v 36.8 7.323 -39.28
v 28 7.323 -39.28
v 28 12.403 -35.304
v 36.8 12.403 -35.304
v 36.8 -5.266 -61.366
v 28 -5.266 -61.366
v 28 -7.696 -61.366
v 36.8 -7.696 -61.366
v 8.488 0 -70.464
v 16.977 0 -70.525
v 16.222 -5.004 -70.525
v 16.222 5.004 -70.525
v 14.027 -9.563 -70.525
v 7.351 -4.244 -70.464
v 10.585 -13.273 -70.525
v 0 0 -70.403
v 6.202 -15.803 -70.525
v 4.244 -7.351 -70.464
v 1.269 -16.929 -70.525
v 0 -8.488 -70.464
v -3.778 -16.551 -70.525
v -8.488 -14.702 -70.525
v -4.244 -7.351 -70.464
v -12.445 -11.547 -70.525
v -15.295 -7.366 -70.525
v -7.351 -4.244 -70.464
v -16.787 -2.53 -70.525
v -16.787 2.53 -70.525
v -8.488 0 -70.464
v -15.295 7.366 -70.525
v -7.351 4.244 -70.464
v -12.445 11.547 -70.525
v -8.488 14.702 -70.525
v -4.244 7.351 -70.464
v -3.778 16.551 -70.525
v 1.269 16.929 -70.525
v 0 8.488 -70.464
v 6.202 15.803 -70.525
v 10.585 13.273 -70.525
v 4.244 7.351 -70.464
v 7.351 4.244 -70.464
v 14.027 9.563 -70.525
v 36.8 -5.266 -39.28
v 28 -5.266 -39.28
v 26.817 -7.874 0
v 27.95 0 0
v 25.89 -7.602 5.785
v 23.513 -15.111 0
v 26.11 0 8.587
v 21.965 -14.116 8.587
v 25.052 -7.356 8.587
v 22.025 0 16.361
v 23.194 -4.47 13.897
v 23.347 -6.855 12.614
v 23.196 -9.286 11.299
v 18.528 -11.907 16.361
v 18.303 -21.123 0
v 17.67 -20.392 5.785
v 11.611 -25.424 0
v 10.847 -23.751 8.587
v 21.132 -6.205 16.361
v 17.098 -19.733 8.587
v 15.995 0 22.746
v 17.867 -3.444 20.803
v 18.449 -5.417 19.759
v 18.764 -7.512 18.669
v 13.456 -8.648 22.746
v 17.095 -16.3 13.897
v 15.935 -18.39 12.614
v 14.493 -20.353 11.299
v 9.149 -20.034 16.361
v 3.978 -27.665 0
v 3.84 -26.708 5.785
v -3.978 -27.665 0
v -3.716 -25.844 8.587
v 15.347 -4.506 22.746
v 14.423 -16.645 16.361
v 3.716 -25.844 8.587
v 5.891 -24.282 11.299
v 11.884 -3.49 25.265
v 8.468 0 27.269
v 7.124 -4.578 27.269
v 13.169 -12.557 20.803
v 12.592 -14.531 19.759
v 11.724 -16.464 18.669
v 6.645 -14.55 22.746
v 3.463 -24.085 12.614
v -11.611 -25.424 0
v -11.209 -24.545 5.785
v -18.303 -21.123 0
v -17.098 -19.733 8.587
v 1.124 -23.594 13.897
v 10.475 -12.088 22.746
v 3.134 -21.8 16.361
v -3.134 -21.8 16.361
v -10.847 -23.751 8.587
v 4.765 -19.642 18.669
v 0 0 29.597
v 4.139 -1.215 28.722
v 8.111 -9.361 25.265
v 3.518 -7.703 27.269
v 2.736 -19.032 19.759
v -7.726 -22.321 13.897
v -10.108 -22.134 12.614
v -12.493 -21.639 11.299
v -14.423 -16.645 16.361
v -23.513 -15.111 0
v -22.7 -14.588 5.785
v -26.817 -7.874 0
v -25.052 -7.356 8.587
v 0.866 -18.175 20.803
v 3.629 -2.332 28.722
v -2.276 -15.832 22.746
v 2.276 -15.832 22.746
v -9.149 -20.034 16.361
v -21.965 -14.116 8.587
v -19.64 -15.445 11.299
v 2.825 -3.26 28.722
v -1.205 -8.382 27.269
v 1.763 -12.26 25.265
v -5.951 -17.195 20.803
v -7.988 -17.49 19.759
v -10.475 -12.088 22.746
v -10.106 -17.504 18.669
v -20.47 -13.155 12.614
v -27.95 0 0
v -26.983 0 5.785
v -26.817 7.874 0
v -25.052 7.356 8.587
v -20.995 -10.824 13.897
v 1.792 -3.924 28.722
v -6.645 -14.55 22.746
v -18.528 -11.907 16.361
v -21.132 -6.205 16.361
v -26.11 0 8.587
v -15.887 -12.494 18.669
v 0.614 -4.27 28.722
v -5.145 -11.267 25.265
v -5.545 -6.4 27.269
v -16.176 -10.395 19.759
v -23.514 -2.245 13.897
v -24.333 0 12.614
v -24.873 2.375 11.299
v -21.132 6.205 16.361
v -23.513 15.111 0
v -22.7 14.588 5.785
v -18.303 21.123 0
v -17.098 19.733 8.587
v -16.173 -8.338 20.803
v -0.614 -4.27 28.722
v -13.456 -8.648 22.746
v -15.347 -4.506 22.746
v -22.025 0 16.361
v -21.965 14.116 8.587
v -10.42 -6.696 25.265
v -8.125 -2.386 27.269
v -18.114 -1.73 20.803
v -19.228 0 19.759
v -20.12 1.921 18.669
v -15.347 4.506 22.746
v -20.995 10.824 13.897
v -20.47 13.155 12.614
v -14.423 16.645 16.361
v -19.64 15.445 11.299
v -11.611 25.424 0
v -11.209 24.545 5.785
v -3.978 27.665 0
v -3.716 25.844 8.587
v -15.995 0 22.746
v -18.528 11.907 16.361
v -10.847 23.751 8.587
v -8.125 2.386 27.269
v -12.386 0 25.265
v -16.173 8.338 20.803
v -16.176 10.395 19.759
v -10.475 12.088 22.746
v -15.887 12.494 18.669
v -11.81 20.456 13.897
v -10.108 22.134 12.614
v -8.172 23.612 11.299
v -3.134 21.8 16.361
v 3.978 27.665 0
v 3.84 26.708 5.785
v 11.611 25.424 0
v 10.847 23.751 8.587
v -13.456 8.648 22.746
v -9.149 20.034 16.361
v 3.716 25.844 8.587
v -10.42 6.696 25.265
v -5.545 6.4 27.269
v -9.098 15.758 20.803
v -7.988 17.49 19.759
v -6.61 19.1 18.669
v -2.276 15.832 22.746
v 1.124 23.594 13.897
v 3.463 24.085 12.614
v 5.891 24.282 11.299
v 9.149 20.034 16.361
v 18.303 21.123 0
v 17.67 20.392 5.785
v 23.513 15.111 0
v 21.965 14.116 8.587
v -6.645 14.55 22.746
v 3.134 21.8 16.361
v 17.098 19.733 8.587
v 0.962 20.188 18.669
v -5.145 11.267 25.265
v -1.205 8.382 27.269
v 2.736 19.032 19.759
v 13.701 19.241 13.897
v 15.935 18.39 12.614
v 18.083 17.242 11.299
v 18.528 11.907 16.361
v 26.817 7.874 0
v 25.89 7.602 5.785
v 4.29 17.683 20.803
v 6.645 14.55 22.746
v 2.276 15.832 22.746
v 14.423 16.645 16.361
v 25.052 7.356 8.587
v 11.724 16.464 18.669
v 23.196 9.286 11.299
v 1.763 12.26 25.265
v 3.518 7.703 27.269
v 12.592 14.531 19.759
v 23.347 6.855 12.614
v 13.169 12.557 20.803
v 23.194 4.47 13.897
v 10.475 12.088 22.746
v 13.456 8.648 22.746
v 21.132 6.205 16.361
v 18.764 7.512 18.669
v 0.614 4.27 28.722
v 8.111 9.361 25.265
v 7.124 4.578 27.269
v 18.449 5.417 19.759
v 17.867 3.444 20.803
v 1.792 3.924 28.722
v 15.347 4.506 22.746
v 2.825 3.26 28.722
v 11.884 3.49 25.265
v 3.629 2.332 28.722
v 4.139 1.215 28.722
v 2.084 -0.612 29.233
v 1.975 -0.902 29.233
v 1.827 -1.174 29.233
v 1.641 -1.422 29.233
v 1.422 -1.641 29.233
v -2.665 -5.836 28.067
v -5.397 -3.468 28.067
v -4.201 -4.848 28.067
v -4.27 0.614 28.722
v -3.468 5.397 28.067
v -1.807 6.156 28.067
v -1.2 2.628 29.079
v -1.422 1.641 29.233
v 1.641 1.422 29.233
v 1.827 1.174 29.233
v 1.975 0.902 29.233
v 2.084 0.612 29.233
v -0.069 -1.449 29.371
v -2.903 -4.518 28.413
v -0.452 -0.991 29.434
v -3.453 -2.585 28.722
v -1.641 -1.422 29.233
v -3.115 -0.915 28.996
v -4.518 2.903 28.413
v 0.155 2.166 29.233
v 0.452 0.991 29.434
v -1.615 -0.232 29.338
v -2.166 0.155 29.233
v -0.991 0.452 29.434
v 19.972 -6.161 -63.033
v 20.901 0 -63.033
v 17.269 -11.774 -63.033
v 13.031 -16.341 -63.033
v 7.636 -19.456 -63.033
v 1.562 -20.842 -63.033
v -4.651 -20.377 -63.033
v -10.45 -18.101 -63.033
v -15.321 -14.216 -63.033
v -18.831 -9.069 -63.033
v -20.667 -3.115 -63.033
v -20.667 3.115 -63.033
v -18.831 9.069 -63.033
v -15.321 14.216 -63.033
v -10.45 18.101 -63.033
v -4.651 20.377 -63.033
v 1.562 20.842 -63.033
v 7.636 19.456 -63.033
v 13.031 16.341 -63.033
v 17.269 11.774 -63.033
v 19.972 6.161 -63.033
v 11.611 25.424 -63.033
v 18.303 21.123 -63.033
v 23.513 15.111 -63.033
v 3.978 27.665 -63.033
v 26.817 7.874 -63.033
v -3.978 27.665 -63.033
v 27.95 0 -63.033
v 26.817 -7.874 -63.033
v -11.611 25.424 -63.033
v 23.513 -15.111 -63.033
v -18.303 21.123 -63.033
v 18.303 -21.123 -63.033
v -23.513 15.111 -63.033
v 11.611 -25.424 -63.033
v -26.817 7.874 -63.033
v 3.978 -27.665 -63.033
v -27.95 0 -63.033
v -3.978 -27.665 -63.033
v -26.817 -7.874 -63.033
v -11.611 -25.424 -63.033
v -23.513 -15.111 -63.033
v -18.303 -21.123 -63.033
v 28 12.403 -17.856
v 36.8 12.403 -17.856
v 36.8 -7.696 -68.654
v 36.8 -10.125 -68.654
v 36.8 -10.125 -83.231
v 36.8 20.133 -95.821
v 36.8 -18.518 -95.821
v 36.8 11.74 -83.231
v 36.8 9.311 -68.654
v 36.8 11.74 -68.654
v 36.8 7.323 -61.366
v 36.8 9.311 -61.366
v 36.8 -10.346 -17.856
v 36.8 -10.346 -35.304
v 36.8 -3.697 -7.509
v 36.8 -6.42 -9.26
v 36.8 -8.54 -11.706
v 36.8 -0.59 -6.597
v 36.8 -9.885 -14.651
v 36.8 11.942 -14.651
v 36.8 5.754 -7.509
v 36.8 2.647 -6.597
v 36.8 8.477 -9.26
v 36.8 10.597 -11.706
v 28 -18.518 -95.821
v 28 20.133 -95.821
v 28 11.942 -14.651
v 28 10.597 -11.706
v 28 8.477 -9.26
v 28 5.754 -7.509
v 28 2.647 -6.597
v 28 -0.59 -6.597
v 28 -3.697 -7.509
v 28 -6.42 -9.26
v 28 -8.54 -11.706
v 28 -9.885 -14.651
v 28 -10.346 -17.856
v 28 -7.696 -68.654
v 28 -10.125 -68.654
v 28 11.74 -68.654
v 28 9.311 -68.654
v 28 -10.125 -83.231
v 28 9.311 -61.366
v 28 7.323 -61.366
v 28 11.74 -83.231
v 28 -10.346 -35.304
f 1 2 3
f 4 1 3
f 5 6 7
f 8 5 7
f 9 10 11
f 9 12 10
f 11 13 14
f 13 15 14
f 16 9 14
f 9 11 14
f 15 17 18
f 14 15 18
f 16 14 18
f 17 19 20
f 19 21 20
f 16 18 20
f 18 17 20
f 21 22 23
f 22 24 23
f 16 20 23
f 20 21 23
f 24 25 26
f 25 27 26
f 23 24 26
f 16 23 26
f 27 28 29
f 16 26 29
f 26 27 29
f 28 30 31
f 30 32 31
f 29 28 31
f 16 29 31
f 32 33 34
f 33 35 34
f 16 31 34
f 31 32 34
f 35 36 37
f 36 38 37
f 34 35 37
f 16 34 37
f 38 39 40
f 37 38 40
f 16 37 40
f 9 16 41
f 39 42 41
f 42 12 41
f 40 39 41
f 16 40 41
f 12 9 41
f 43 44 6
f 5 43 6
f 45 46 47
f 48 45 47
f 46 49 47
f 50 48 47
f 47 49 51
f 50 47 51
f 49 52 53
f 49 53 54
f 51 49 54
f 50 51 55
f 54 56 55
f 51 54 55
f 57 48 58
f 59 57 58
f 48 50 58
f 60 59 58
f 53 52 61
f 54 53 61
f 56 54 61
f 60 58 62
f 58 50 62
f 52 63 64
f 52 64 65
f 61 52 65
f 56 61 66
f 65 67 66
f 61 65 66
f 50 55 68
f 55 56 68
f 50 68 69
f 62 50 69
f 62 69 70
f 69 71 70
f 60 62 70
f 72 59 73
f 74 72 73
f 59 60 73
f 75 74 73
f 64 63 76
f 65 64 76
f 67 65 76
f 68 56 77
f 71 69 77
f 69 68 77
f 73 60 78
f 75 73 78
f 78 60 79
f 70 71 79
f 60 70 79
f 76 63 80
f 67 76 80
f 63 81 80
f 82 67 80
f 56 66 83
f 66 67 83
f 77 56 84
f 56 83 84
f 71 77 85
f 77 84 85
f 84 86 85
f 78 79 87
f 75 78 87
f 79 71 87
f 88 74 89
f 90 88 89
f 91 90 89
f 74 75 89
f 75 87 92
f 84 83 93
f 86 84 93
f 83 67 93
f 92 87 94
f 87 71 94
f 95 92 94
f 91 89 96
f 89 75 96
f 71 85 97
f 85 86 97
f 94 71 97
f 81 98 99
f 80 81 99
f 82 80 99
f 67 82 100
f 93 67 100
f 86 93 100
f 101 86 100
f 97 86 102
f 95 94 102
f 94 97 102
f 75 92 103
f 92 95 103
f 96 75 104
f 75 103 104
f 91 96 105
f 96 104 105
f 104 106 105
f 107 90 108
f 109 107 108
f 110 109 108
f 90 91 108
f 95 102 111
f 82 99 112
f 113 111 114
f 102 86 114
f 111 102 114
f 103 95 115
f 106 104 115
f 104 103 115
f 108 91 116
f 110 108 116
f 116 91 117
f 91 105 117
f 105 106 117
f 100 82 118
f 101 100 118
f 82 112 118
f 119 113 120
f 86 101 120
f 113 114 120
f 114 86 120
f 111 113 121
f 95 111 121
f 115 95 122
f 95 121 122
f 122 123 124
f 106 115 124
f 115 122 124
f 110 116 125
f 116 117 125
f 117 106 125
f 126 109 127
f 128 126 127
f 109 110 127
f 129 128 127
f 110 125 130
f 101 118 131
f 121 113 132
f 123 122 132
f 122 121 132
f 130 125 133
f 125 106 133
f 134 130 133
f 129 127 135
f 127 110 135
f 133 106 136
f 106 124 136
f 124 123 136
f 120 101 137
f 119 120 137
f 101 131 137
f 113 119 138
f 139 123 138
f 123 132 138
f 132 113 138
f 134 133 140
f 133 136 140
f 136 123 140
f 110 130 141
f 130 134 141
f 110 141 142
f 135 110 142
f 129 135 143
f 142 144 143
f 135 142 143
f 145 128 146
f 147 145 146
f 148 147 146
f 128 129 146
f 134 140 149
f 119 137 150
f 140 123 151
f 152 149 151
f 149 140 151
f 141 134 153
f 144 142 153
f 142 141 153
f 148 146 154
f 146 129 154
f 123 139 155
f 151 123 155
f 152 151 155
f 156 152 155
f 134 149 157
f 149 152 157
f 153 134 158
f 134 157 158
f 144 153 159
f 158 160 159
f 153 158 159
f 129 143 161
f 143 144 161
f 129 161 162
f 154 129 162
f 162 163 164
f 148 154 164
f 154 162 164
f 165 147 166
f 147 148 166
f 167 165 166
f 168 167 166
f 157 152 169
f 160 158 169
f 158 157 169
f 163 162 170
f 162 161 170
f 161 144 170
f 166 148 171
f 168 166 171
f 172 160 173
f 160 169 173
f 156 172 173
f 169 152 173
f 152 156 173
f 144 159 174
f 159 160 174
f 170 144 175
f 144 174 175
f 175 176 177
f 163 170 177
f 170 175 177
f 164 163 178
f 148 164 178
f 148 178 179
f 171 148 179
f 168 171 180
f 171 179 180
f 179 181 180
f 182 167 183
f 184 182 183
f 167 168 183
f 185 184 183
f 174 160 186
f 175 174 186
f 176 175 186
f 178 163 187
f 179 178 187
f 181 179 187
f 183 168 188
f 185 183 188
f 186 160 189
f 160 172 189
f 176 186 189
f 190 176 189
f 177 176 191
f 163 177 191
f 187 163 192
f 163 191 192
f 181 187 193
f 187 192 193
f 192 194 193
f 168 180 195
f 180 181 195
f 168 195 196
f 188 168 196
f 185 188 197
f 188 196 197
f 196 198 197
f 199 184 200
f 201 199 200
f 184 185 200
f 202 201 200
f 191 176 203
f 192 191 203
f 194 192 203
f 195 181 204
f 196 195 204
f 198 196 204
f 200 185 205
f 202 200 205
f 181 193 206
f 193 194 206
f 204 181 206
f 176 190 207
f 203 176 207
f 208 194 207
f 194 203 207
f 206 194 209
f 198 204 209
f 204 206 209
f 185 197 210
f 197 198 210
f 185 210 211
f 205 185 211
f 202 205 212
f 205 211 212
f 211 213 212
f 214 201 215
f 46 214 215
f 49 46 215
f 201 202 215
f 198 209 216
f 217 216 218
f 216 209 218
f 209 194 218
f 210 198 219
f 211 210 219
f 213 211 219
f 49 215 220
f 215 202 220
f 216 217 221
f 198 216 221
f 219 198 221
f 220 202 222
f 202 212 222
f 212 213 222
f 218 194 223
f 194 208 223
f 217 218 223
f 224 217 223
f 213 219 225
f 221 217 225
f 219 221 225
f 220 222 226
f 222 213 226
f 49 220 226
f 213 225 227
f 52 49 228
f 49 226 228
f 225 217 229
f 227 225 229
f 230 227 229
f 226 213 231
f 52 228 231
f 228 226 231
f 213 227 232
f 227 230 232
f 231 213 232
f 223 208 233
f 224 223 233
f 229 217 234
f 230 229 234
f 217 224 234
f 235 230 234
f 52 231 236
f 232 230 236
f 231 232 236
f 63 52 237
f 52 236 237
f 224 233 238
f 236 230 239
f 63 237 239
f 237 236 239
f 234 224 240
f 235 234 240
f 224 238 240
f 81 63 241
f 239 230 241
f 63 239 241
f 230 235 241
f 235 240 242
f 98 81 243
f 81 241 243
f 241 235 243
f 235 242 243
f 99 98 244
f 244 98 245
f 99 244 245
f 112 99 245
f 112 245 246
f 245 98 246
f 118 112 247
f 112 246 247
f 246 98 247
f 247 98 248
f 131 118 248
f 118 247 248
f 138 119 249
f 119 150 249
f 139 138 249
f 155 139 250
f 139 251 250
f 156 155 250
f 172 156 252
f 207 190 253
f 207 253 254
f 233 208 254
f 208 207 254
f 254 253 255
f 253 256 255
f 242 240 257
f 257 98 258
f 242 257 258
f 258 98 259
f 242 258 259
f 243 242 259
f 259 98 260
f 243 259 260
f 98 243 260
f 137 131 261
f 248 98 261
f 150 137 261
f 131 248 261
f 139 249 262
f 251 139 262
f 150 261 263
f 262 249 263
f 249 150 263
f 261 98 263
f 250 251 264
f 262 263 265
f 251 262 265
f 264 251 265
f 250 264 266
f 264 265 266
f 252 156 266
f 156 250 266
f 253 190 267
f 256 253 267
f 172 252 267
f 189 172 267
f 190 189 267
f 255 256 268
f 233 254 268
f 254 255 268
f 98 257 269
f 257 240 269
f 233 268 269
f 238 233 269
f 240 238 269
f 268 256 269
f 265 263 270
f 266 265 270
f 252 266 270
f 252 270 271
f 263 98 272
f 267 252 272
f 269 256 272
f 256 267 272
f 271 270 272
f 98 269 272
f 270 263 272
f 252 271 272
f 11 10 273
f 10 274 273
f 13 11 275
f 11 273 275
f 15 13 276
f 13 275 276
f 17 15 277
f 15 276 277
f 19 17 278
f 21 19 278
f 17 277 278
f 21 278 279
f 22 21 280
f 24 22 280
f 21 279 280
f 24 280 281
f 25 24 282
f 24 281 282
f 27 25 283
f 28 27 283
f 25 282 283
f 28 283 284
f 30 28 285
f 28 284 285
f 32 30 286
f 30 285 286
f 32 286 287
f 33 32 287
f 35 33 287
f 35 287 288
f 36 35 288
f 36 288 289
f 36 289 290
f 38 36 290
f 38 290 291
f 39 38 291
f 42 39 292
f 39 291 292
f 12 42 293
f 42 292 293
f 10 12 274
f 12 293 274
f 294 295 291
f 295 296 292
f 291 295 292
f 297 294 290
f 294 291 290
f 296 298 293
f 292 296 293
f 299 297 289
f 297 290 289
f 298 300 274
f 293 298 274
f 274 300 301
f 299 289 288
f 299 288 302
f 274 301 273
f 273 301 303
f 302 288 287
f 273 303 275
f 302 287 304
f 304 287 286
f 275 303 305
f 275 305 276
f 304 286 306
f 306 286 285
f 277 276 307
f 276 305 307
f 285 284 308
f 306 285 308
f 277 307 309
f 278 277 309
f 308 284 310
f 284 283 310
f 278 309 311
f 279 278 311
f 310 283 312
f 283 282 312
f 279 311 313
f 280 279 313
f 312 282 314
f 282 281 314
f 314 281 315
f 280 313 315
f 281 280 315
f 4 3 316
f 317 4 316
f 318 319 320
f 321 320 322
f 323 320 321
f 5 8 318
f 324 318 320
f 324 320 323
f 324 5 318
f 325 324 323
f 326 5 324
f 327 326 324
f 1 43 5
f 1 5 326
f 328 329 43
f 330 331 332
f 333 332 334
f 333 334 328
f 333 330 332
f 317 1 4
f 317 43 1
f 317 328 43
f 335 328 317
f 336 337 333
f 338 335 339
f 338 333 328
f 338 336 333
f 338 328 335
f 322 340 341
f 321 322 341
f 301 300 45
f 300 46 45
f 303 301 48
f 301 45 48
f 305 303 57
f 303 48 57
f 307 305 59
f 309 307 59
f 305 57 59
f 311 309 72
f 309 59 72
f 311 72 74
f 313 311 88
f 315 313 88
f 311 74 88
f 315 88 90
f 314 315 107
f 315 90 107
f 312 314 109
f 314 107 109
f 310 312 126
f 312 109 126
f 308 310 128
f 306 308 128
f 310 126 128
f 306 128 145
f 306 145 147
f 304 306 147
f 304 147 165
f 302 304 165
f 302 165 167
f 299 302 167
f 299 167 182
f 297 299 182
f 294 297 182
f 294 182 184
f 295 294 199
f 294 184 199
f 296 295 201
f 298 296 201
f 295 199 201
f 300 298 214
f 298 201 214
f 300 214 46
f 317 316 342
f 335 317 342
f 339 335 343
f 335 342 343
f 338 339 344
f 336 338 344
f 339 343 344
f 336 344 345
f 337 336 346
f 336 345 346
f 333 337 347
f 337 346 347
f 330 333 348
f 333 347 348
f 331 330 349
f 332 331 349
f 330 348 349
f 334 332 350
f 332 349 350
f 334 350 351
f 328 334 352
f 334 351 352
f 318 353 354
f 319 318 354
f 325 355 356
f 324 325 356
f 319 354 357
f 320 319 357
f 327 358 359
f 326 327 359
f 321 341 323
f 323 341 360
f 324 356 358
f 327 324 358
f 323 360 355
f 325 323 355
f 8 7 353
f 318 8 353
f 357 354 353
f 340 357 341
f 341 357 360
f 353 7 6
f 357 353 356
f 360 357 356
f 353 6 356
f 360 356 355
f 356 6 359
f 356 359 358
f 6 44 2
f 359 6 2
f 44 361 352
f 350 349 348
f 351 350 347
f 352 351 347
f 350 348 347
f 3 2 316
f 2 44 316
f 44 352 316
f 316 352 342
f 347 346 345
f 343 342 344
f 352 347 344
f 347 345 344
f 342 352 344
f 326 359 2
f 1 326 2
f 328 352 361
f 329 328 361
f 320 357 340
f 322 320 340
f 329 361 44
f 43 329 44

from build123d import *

# Parameters (mm, degrees)
F4_DEPTH = 8.8


with BuildPart() as f1:
    # F0 (on Front) → F1 (revolve)
    with BuildSketch(Plane.XZ):
        with BuildLine():
            ThreePointArc((27.9495026916, 0), (19.2278922615, 19.7592115619), (0, 29.5969495755))
            Line((0, 29.5969495755), (0, -70.4030504245))
            Line((0, -70.4030504245), (16.9765111059, -70.5251395702))
            Line((16.9765111059, -70.5251395702), (20.9008958191, -63.0331337452))
            Line((20.9008958191, -63.0331337452), (27.9495026916, -63.0331337452))
            Line((27.9495026916, -63.0331337452), (27.9495026916, 0))
        make_face()
    revolve(axis=Axis((0, 0, -20.4030504245), (0, 0, -1)))


with BuildPart() as f4:
    # F3 (on offset) → F4 (new body)
    with BuildSketch(Plane.YZ.offset(28)):
        with BuildLine():
            Line((-10.345963412, -17.8559850901), (-10.345963412, -35.3041645139))
            Line((-10.345963412, -35.3041645139), (-5.2661128575, -39.2796974629))
            Line((-5.2661128575, -39.2796974629), (-5.2661128575, -61.3659974188))
            Line((-5.2661128575, -61.3659974188), (-7.6956056291, -61.3659974188))
            Line((-7.6956056291, -61.3659974188), (-7.6956056291, -68.6544794589))
            Line((-7.6956056291, -68.6544794589), (-10.1250984007, -68.6544794589))
            Line((-10.1250984007, -68.6544794589), (-10.1250984007, -83.2314360887))
            Line((-10.1250984007, -83.2314360887), (-18.5178943211, -95.8206299692))
            Line((-18.5178943211, -95.8206299692), (20.1331399148, -95.8206299692))
            Line((20.1331399148, -95.8206299692), (11.7403439945, -83.2314360887))
            Line((11.7403439945, -83.2314360887), (11.7403439945, -68.6544794589))
            Line((11.7403439945, -68.6544794589), (9.3108512228, -68.6544794589))
            Line((9.3108512228, -68.6544794589), (9.3108512228, -61.3659974188))
            Line((9.3108512228, -61.3659974188), (7.3230810231, -61.3659974188))
            Line((7.3230810231, -61.3659974188), (7.3230810231, -39.2796974629))
            Line((7.3230810231, -39.2796974629), (12.4029315775, -35.3041645139))
            Line((12.4029315775, -35.3041645139), (12.4029315775, -17.8559850901))
            ThreePointArc((12.4029315775, -17.8559850901), (1.0284840828, -6.4815375954), (-10.345963412, -17.8559850901))
        make_face()
    extrude(amount=F4_DEPTH)


solid = Compound([f1.part, f4.part])
